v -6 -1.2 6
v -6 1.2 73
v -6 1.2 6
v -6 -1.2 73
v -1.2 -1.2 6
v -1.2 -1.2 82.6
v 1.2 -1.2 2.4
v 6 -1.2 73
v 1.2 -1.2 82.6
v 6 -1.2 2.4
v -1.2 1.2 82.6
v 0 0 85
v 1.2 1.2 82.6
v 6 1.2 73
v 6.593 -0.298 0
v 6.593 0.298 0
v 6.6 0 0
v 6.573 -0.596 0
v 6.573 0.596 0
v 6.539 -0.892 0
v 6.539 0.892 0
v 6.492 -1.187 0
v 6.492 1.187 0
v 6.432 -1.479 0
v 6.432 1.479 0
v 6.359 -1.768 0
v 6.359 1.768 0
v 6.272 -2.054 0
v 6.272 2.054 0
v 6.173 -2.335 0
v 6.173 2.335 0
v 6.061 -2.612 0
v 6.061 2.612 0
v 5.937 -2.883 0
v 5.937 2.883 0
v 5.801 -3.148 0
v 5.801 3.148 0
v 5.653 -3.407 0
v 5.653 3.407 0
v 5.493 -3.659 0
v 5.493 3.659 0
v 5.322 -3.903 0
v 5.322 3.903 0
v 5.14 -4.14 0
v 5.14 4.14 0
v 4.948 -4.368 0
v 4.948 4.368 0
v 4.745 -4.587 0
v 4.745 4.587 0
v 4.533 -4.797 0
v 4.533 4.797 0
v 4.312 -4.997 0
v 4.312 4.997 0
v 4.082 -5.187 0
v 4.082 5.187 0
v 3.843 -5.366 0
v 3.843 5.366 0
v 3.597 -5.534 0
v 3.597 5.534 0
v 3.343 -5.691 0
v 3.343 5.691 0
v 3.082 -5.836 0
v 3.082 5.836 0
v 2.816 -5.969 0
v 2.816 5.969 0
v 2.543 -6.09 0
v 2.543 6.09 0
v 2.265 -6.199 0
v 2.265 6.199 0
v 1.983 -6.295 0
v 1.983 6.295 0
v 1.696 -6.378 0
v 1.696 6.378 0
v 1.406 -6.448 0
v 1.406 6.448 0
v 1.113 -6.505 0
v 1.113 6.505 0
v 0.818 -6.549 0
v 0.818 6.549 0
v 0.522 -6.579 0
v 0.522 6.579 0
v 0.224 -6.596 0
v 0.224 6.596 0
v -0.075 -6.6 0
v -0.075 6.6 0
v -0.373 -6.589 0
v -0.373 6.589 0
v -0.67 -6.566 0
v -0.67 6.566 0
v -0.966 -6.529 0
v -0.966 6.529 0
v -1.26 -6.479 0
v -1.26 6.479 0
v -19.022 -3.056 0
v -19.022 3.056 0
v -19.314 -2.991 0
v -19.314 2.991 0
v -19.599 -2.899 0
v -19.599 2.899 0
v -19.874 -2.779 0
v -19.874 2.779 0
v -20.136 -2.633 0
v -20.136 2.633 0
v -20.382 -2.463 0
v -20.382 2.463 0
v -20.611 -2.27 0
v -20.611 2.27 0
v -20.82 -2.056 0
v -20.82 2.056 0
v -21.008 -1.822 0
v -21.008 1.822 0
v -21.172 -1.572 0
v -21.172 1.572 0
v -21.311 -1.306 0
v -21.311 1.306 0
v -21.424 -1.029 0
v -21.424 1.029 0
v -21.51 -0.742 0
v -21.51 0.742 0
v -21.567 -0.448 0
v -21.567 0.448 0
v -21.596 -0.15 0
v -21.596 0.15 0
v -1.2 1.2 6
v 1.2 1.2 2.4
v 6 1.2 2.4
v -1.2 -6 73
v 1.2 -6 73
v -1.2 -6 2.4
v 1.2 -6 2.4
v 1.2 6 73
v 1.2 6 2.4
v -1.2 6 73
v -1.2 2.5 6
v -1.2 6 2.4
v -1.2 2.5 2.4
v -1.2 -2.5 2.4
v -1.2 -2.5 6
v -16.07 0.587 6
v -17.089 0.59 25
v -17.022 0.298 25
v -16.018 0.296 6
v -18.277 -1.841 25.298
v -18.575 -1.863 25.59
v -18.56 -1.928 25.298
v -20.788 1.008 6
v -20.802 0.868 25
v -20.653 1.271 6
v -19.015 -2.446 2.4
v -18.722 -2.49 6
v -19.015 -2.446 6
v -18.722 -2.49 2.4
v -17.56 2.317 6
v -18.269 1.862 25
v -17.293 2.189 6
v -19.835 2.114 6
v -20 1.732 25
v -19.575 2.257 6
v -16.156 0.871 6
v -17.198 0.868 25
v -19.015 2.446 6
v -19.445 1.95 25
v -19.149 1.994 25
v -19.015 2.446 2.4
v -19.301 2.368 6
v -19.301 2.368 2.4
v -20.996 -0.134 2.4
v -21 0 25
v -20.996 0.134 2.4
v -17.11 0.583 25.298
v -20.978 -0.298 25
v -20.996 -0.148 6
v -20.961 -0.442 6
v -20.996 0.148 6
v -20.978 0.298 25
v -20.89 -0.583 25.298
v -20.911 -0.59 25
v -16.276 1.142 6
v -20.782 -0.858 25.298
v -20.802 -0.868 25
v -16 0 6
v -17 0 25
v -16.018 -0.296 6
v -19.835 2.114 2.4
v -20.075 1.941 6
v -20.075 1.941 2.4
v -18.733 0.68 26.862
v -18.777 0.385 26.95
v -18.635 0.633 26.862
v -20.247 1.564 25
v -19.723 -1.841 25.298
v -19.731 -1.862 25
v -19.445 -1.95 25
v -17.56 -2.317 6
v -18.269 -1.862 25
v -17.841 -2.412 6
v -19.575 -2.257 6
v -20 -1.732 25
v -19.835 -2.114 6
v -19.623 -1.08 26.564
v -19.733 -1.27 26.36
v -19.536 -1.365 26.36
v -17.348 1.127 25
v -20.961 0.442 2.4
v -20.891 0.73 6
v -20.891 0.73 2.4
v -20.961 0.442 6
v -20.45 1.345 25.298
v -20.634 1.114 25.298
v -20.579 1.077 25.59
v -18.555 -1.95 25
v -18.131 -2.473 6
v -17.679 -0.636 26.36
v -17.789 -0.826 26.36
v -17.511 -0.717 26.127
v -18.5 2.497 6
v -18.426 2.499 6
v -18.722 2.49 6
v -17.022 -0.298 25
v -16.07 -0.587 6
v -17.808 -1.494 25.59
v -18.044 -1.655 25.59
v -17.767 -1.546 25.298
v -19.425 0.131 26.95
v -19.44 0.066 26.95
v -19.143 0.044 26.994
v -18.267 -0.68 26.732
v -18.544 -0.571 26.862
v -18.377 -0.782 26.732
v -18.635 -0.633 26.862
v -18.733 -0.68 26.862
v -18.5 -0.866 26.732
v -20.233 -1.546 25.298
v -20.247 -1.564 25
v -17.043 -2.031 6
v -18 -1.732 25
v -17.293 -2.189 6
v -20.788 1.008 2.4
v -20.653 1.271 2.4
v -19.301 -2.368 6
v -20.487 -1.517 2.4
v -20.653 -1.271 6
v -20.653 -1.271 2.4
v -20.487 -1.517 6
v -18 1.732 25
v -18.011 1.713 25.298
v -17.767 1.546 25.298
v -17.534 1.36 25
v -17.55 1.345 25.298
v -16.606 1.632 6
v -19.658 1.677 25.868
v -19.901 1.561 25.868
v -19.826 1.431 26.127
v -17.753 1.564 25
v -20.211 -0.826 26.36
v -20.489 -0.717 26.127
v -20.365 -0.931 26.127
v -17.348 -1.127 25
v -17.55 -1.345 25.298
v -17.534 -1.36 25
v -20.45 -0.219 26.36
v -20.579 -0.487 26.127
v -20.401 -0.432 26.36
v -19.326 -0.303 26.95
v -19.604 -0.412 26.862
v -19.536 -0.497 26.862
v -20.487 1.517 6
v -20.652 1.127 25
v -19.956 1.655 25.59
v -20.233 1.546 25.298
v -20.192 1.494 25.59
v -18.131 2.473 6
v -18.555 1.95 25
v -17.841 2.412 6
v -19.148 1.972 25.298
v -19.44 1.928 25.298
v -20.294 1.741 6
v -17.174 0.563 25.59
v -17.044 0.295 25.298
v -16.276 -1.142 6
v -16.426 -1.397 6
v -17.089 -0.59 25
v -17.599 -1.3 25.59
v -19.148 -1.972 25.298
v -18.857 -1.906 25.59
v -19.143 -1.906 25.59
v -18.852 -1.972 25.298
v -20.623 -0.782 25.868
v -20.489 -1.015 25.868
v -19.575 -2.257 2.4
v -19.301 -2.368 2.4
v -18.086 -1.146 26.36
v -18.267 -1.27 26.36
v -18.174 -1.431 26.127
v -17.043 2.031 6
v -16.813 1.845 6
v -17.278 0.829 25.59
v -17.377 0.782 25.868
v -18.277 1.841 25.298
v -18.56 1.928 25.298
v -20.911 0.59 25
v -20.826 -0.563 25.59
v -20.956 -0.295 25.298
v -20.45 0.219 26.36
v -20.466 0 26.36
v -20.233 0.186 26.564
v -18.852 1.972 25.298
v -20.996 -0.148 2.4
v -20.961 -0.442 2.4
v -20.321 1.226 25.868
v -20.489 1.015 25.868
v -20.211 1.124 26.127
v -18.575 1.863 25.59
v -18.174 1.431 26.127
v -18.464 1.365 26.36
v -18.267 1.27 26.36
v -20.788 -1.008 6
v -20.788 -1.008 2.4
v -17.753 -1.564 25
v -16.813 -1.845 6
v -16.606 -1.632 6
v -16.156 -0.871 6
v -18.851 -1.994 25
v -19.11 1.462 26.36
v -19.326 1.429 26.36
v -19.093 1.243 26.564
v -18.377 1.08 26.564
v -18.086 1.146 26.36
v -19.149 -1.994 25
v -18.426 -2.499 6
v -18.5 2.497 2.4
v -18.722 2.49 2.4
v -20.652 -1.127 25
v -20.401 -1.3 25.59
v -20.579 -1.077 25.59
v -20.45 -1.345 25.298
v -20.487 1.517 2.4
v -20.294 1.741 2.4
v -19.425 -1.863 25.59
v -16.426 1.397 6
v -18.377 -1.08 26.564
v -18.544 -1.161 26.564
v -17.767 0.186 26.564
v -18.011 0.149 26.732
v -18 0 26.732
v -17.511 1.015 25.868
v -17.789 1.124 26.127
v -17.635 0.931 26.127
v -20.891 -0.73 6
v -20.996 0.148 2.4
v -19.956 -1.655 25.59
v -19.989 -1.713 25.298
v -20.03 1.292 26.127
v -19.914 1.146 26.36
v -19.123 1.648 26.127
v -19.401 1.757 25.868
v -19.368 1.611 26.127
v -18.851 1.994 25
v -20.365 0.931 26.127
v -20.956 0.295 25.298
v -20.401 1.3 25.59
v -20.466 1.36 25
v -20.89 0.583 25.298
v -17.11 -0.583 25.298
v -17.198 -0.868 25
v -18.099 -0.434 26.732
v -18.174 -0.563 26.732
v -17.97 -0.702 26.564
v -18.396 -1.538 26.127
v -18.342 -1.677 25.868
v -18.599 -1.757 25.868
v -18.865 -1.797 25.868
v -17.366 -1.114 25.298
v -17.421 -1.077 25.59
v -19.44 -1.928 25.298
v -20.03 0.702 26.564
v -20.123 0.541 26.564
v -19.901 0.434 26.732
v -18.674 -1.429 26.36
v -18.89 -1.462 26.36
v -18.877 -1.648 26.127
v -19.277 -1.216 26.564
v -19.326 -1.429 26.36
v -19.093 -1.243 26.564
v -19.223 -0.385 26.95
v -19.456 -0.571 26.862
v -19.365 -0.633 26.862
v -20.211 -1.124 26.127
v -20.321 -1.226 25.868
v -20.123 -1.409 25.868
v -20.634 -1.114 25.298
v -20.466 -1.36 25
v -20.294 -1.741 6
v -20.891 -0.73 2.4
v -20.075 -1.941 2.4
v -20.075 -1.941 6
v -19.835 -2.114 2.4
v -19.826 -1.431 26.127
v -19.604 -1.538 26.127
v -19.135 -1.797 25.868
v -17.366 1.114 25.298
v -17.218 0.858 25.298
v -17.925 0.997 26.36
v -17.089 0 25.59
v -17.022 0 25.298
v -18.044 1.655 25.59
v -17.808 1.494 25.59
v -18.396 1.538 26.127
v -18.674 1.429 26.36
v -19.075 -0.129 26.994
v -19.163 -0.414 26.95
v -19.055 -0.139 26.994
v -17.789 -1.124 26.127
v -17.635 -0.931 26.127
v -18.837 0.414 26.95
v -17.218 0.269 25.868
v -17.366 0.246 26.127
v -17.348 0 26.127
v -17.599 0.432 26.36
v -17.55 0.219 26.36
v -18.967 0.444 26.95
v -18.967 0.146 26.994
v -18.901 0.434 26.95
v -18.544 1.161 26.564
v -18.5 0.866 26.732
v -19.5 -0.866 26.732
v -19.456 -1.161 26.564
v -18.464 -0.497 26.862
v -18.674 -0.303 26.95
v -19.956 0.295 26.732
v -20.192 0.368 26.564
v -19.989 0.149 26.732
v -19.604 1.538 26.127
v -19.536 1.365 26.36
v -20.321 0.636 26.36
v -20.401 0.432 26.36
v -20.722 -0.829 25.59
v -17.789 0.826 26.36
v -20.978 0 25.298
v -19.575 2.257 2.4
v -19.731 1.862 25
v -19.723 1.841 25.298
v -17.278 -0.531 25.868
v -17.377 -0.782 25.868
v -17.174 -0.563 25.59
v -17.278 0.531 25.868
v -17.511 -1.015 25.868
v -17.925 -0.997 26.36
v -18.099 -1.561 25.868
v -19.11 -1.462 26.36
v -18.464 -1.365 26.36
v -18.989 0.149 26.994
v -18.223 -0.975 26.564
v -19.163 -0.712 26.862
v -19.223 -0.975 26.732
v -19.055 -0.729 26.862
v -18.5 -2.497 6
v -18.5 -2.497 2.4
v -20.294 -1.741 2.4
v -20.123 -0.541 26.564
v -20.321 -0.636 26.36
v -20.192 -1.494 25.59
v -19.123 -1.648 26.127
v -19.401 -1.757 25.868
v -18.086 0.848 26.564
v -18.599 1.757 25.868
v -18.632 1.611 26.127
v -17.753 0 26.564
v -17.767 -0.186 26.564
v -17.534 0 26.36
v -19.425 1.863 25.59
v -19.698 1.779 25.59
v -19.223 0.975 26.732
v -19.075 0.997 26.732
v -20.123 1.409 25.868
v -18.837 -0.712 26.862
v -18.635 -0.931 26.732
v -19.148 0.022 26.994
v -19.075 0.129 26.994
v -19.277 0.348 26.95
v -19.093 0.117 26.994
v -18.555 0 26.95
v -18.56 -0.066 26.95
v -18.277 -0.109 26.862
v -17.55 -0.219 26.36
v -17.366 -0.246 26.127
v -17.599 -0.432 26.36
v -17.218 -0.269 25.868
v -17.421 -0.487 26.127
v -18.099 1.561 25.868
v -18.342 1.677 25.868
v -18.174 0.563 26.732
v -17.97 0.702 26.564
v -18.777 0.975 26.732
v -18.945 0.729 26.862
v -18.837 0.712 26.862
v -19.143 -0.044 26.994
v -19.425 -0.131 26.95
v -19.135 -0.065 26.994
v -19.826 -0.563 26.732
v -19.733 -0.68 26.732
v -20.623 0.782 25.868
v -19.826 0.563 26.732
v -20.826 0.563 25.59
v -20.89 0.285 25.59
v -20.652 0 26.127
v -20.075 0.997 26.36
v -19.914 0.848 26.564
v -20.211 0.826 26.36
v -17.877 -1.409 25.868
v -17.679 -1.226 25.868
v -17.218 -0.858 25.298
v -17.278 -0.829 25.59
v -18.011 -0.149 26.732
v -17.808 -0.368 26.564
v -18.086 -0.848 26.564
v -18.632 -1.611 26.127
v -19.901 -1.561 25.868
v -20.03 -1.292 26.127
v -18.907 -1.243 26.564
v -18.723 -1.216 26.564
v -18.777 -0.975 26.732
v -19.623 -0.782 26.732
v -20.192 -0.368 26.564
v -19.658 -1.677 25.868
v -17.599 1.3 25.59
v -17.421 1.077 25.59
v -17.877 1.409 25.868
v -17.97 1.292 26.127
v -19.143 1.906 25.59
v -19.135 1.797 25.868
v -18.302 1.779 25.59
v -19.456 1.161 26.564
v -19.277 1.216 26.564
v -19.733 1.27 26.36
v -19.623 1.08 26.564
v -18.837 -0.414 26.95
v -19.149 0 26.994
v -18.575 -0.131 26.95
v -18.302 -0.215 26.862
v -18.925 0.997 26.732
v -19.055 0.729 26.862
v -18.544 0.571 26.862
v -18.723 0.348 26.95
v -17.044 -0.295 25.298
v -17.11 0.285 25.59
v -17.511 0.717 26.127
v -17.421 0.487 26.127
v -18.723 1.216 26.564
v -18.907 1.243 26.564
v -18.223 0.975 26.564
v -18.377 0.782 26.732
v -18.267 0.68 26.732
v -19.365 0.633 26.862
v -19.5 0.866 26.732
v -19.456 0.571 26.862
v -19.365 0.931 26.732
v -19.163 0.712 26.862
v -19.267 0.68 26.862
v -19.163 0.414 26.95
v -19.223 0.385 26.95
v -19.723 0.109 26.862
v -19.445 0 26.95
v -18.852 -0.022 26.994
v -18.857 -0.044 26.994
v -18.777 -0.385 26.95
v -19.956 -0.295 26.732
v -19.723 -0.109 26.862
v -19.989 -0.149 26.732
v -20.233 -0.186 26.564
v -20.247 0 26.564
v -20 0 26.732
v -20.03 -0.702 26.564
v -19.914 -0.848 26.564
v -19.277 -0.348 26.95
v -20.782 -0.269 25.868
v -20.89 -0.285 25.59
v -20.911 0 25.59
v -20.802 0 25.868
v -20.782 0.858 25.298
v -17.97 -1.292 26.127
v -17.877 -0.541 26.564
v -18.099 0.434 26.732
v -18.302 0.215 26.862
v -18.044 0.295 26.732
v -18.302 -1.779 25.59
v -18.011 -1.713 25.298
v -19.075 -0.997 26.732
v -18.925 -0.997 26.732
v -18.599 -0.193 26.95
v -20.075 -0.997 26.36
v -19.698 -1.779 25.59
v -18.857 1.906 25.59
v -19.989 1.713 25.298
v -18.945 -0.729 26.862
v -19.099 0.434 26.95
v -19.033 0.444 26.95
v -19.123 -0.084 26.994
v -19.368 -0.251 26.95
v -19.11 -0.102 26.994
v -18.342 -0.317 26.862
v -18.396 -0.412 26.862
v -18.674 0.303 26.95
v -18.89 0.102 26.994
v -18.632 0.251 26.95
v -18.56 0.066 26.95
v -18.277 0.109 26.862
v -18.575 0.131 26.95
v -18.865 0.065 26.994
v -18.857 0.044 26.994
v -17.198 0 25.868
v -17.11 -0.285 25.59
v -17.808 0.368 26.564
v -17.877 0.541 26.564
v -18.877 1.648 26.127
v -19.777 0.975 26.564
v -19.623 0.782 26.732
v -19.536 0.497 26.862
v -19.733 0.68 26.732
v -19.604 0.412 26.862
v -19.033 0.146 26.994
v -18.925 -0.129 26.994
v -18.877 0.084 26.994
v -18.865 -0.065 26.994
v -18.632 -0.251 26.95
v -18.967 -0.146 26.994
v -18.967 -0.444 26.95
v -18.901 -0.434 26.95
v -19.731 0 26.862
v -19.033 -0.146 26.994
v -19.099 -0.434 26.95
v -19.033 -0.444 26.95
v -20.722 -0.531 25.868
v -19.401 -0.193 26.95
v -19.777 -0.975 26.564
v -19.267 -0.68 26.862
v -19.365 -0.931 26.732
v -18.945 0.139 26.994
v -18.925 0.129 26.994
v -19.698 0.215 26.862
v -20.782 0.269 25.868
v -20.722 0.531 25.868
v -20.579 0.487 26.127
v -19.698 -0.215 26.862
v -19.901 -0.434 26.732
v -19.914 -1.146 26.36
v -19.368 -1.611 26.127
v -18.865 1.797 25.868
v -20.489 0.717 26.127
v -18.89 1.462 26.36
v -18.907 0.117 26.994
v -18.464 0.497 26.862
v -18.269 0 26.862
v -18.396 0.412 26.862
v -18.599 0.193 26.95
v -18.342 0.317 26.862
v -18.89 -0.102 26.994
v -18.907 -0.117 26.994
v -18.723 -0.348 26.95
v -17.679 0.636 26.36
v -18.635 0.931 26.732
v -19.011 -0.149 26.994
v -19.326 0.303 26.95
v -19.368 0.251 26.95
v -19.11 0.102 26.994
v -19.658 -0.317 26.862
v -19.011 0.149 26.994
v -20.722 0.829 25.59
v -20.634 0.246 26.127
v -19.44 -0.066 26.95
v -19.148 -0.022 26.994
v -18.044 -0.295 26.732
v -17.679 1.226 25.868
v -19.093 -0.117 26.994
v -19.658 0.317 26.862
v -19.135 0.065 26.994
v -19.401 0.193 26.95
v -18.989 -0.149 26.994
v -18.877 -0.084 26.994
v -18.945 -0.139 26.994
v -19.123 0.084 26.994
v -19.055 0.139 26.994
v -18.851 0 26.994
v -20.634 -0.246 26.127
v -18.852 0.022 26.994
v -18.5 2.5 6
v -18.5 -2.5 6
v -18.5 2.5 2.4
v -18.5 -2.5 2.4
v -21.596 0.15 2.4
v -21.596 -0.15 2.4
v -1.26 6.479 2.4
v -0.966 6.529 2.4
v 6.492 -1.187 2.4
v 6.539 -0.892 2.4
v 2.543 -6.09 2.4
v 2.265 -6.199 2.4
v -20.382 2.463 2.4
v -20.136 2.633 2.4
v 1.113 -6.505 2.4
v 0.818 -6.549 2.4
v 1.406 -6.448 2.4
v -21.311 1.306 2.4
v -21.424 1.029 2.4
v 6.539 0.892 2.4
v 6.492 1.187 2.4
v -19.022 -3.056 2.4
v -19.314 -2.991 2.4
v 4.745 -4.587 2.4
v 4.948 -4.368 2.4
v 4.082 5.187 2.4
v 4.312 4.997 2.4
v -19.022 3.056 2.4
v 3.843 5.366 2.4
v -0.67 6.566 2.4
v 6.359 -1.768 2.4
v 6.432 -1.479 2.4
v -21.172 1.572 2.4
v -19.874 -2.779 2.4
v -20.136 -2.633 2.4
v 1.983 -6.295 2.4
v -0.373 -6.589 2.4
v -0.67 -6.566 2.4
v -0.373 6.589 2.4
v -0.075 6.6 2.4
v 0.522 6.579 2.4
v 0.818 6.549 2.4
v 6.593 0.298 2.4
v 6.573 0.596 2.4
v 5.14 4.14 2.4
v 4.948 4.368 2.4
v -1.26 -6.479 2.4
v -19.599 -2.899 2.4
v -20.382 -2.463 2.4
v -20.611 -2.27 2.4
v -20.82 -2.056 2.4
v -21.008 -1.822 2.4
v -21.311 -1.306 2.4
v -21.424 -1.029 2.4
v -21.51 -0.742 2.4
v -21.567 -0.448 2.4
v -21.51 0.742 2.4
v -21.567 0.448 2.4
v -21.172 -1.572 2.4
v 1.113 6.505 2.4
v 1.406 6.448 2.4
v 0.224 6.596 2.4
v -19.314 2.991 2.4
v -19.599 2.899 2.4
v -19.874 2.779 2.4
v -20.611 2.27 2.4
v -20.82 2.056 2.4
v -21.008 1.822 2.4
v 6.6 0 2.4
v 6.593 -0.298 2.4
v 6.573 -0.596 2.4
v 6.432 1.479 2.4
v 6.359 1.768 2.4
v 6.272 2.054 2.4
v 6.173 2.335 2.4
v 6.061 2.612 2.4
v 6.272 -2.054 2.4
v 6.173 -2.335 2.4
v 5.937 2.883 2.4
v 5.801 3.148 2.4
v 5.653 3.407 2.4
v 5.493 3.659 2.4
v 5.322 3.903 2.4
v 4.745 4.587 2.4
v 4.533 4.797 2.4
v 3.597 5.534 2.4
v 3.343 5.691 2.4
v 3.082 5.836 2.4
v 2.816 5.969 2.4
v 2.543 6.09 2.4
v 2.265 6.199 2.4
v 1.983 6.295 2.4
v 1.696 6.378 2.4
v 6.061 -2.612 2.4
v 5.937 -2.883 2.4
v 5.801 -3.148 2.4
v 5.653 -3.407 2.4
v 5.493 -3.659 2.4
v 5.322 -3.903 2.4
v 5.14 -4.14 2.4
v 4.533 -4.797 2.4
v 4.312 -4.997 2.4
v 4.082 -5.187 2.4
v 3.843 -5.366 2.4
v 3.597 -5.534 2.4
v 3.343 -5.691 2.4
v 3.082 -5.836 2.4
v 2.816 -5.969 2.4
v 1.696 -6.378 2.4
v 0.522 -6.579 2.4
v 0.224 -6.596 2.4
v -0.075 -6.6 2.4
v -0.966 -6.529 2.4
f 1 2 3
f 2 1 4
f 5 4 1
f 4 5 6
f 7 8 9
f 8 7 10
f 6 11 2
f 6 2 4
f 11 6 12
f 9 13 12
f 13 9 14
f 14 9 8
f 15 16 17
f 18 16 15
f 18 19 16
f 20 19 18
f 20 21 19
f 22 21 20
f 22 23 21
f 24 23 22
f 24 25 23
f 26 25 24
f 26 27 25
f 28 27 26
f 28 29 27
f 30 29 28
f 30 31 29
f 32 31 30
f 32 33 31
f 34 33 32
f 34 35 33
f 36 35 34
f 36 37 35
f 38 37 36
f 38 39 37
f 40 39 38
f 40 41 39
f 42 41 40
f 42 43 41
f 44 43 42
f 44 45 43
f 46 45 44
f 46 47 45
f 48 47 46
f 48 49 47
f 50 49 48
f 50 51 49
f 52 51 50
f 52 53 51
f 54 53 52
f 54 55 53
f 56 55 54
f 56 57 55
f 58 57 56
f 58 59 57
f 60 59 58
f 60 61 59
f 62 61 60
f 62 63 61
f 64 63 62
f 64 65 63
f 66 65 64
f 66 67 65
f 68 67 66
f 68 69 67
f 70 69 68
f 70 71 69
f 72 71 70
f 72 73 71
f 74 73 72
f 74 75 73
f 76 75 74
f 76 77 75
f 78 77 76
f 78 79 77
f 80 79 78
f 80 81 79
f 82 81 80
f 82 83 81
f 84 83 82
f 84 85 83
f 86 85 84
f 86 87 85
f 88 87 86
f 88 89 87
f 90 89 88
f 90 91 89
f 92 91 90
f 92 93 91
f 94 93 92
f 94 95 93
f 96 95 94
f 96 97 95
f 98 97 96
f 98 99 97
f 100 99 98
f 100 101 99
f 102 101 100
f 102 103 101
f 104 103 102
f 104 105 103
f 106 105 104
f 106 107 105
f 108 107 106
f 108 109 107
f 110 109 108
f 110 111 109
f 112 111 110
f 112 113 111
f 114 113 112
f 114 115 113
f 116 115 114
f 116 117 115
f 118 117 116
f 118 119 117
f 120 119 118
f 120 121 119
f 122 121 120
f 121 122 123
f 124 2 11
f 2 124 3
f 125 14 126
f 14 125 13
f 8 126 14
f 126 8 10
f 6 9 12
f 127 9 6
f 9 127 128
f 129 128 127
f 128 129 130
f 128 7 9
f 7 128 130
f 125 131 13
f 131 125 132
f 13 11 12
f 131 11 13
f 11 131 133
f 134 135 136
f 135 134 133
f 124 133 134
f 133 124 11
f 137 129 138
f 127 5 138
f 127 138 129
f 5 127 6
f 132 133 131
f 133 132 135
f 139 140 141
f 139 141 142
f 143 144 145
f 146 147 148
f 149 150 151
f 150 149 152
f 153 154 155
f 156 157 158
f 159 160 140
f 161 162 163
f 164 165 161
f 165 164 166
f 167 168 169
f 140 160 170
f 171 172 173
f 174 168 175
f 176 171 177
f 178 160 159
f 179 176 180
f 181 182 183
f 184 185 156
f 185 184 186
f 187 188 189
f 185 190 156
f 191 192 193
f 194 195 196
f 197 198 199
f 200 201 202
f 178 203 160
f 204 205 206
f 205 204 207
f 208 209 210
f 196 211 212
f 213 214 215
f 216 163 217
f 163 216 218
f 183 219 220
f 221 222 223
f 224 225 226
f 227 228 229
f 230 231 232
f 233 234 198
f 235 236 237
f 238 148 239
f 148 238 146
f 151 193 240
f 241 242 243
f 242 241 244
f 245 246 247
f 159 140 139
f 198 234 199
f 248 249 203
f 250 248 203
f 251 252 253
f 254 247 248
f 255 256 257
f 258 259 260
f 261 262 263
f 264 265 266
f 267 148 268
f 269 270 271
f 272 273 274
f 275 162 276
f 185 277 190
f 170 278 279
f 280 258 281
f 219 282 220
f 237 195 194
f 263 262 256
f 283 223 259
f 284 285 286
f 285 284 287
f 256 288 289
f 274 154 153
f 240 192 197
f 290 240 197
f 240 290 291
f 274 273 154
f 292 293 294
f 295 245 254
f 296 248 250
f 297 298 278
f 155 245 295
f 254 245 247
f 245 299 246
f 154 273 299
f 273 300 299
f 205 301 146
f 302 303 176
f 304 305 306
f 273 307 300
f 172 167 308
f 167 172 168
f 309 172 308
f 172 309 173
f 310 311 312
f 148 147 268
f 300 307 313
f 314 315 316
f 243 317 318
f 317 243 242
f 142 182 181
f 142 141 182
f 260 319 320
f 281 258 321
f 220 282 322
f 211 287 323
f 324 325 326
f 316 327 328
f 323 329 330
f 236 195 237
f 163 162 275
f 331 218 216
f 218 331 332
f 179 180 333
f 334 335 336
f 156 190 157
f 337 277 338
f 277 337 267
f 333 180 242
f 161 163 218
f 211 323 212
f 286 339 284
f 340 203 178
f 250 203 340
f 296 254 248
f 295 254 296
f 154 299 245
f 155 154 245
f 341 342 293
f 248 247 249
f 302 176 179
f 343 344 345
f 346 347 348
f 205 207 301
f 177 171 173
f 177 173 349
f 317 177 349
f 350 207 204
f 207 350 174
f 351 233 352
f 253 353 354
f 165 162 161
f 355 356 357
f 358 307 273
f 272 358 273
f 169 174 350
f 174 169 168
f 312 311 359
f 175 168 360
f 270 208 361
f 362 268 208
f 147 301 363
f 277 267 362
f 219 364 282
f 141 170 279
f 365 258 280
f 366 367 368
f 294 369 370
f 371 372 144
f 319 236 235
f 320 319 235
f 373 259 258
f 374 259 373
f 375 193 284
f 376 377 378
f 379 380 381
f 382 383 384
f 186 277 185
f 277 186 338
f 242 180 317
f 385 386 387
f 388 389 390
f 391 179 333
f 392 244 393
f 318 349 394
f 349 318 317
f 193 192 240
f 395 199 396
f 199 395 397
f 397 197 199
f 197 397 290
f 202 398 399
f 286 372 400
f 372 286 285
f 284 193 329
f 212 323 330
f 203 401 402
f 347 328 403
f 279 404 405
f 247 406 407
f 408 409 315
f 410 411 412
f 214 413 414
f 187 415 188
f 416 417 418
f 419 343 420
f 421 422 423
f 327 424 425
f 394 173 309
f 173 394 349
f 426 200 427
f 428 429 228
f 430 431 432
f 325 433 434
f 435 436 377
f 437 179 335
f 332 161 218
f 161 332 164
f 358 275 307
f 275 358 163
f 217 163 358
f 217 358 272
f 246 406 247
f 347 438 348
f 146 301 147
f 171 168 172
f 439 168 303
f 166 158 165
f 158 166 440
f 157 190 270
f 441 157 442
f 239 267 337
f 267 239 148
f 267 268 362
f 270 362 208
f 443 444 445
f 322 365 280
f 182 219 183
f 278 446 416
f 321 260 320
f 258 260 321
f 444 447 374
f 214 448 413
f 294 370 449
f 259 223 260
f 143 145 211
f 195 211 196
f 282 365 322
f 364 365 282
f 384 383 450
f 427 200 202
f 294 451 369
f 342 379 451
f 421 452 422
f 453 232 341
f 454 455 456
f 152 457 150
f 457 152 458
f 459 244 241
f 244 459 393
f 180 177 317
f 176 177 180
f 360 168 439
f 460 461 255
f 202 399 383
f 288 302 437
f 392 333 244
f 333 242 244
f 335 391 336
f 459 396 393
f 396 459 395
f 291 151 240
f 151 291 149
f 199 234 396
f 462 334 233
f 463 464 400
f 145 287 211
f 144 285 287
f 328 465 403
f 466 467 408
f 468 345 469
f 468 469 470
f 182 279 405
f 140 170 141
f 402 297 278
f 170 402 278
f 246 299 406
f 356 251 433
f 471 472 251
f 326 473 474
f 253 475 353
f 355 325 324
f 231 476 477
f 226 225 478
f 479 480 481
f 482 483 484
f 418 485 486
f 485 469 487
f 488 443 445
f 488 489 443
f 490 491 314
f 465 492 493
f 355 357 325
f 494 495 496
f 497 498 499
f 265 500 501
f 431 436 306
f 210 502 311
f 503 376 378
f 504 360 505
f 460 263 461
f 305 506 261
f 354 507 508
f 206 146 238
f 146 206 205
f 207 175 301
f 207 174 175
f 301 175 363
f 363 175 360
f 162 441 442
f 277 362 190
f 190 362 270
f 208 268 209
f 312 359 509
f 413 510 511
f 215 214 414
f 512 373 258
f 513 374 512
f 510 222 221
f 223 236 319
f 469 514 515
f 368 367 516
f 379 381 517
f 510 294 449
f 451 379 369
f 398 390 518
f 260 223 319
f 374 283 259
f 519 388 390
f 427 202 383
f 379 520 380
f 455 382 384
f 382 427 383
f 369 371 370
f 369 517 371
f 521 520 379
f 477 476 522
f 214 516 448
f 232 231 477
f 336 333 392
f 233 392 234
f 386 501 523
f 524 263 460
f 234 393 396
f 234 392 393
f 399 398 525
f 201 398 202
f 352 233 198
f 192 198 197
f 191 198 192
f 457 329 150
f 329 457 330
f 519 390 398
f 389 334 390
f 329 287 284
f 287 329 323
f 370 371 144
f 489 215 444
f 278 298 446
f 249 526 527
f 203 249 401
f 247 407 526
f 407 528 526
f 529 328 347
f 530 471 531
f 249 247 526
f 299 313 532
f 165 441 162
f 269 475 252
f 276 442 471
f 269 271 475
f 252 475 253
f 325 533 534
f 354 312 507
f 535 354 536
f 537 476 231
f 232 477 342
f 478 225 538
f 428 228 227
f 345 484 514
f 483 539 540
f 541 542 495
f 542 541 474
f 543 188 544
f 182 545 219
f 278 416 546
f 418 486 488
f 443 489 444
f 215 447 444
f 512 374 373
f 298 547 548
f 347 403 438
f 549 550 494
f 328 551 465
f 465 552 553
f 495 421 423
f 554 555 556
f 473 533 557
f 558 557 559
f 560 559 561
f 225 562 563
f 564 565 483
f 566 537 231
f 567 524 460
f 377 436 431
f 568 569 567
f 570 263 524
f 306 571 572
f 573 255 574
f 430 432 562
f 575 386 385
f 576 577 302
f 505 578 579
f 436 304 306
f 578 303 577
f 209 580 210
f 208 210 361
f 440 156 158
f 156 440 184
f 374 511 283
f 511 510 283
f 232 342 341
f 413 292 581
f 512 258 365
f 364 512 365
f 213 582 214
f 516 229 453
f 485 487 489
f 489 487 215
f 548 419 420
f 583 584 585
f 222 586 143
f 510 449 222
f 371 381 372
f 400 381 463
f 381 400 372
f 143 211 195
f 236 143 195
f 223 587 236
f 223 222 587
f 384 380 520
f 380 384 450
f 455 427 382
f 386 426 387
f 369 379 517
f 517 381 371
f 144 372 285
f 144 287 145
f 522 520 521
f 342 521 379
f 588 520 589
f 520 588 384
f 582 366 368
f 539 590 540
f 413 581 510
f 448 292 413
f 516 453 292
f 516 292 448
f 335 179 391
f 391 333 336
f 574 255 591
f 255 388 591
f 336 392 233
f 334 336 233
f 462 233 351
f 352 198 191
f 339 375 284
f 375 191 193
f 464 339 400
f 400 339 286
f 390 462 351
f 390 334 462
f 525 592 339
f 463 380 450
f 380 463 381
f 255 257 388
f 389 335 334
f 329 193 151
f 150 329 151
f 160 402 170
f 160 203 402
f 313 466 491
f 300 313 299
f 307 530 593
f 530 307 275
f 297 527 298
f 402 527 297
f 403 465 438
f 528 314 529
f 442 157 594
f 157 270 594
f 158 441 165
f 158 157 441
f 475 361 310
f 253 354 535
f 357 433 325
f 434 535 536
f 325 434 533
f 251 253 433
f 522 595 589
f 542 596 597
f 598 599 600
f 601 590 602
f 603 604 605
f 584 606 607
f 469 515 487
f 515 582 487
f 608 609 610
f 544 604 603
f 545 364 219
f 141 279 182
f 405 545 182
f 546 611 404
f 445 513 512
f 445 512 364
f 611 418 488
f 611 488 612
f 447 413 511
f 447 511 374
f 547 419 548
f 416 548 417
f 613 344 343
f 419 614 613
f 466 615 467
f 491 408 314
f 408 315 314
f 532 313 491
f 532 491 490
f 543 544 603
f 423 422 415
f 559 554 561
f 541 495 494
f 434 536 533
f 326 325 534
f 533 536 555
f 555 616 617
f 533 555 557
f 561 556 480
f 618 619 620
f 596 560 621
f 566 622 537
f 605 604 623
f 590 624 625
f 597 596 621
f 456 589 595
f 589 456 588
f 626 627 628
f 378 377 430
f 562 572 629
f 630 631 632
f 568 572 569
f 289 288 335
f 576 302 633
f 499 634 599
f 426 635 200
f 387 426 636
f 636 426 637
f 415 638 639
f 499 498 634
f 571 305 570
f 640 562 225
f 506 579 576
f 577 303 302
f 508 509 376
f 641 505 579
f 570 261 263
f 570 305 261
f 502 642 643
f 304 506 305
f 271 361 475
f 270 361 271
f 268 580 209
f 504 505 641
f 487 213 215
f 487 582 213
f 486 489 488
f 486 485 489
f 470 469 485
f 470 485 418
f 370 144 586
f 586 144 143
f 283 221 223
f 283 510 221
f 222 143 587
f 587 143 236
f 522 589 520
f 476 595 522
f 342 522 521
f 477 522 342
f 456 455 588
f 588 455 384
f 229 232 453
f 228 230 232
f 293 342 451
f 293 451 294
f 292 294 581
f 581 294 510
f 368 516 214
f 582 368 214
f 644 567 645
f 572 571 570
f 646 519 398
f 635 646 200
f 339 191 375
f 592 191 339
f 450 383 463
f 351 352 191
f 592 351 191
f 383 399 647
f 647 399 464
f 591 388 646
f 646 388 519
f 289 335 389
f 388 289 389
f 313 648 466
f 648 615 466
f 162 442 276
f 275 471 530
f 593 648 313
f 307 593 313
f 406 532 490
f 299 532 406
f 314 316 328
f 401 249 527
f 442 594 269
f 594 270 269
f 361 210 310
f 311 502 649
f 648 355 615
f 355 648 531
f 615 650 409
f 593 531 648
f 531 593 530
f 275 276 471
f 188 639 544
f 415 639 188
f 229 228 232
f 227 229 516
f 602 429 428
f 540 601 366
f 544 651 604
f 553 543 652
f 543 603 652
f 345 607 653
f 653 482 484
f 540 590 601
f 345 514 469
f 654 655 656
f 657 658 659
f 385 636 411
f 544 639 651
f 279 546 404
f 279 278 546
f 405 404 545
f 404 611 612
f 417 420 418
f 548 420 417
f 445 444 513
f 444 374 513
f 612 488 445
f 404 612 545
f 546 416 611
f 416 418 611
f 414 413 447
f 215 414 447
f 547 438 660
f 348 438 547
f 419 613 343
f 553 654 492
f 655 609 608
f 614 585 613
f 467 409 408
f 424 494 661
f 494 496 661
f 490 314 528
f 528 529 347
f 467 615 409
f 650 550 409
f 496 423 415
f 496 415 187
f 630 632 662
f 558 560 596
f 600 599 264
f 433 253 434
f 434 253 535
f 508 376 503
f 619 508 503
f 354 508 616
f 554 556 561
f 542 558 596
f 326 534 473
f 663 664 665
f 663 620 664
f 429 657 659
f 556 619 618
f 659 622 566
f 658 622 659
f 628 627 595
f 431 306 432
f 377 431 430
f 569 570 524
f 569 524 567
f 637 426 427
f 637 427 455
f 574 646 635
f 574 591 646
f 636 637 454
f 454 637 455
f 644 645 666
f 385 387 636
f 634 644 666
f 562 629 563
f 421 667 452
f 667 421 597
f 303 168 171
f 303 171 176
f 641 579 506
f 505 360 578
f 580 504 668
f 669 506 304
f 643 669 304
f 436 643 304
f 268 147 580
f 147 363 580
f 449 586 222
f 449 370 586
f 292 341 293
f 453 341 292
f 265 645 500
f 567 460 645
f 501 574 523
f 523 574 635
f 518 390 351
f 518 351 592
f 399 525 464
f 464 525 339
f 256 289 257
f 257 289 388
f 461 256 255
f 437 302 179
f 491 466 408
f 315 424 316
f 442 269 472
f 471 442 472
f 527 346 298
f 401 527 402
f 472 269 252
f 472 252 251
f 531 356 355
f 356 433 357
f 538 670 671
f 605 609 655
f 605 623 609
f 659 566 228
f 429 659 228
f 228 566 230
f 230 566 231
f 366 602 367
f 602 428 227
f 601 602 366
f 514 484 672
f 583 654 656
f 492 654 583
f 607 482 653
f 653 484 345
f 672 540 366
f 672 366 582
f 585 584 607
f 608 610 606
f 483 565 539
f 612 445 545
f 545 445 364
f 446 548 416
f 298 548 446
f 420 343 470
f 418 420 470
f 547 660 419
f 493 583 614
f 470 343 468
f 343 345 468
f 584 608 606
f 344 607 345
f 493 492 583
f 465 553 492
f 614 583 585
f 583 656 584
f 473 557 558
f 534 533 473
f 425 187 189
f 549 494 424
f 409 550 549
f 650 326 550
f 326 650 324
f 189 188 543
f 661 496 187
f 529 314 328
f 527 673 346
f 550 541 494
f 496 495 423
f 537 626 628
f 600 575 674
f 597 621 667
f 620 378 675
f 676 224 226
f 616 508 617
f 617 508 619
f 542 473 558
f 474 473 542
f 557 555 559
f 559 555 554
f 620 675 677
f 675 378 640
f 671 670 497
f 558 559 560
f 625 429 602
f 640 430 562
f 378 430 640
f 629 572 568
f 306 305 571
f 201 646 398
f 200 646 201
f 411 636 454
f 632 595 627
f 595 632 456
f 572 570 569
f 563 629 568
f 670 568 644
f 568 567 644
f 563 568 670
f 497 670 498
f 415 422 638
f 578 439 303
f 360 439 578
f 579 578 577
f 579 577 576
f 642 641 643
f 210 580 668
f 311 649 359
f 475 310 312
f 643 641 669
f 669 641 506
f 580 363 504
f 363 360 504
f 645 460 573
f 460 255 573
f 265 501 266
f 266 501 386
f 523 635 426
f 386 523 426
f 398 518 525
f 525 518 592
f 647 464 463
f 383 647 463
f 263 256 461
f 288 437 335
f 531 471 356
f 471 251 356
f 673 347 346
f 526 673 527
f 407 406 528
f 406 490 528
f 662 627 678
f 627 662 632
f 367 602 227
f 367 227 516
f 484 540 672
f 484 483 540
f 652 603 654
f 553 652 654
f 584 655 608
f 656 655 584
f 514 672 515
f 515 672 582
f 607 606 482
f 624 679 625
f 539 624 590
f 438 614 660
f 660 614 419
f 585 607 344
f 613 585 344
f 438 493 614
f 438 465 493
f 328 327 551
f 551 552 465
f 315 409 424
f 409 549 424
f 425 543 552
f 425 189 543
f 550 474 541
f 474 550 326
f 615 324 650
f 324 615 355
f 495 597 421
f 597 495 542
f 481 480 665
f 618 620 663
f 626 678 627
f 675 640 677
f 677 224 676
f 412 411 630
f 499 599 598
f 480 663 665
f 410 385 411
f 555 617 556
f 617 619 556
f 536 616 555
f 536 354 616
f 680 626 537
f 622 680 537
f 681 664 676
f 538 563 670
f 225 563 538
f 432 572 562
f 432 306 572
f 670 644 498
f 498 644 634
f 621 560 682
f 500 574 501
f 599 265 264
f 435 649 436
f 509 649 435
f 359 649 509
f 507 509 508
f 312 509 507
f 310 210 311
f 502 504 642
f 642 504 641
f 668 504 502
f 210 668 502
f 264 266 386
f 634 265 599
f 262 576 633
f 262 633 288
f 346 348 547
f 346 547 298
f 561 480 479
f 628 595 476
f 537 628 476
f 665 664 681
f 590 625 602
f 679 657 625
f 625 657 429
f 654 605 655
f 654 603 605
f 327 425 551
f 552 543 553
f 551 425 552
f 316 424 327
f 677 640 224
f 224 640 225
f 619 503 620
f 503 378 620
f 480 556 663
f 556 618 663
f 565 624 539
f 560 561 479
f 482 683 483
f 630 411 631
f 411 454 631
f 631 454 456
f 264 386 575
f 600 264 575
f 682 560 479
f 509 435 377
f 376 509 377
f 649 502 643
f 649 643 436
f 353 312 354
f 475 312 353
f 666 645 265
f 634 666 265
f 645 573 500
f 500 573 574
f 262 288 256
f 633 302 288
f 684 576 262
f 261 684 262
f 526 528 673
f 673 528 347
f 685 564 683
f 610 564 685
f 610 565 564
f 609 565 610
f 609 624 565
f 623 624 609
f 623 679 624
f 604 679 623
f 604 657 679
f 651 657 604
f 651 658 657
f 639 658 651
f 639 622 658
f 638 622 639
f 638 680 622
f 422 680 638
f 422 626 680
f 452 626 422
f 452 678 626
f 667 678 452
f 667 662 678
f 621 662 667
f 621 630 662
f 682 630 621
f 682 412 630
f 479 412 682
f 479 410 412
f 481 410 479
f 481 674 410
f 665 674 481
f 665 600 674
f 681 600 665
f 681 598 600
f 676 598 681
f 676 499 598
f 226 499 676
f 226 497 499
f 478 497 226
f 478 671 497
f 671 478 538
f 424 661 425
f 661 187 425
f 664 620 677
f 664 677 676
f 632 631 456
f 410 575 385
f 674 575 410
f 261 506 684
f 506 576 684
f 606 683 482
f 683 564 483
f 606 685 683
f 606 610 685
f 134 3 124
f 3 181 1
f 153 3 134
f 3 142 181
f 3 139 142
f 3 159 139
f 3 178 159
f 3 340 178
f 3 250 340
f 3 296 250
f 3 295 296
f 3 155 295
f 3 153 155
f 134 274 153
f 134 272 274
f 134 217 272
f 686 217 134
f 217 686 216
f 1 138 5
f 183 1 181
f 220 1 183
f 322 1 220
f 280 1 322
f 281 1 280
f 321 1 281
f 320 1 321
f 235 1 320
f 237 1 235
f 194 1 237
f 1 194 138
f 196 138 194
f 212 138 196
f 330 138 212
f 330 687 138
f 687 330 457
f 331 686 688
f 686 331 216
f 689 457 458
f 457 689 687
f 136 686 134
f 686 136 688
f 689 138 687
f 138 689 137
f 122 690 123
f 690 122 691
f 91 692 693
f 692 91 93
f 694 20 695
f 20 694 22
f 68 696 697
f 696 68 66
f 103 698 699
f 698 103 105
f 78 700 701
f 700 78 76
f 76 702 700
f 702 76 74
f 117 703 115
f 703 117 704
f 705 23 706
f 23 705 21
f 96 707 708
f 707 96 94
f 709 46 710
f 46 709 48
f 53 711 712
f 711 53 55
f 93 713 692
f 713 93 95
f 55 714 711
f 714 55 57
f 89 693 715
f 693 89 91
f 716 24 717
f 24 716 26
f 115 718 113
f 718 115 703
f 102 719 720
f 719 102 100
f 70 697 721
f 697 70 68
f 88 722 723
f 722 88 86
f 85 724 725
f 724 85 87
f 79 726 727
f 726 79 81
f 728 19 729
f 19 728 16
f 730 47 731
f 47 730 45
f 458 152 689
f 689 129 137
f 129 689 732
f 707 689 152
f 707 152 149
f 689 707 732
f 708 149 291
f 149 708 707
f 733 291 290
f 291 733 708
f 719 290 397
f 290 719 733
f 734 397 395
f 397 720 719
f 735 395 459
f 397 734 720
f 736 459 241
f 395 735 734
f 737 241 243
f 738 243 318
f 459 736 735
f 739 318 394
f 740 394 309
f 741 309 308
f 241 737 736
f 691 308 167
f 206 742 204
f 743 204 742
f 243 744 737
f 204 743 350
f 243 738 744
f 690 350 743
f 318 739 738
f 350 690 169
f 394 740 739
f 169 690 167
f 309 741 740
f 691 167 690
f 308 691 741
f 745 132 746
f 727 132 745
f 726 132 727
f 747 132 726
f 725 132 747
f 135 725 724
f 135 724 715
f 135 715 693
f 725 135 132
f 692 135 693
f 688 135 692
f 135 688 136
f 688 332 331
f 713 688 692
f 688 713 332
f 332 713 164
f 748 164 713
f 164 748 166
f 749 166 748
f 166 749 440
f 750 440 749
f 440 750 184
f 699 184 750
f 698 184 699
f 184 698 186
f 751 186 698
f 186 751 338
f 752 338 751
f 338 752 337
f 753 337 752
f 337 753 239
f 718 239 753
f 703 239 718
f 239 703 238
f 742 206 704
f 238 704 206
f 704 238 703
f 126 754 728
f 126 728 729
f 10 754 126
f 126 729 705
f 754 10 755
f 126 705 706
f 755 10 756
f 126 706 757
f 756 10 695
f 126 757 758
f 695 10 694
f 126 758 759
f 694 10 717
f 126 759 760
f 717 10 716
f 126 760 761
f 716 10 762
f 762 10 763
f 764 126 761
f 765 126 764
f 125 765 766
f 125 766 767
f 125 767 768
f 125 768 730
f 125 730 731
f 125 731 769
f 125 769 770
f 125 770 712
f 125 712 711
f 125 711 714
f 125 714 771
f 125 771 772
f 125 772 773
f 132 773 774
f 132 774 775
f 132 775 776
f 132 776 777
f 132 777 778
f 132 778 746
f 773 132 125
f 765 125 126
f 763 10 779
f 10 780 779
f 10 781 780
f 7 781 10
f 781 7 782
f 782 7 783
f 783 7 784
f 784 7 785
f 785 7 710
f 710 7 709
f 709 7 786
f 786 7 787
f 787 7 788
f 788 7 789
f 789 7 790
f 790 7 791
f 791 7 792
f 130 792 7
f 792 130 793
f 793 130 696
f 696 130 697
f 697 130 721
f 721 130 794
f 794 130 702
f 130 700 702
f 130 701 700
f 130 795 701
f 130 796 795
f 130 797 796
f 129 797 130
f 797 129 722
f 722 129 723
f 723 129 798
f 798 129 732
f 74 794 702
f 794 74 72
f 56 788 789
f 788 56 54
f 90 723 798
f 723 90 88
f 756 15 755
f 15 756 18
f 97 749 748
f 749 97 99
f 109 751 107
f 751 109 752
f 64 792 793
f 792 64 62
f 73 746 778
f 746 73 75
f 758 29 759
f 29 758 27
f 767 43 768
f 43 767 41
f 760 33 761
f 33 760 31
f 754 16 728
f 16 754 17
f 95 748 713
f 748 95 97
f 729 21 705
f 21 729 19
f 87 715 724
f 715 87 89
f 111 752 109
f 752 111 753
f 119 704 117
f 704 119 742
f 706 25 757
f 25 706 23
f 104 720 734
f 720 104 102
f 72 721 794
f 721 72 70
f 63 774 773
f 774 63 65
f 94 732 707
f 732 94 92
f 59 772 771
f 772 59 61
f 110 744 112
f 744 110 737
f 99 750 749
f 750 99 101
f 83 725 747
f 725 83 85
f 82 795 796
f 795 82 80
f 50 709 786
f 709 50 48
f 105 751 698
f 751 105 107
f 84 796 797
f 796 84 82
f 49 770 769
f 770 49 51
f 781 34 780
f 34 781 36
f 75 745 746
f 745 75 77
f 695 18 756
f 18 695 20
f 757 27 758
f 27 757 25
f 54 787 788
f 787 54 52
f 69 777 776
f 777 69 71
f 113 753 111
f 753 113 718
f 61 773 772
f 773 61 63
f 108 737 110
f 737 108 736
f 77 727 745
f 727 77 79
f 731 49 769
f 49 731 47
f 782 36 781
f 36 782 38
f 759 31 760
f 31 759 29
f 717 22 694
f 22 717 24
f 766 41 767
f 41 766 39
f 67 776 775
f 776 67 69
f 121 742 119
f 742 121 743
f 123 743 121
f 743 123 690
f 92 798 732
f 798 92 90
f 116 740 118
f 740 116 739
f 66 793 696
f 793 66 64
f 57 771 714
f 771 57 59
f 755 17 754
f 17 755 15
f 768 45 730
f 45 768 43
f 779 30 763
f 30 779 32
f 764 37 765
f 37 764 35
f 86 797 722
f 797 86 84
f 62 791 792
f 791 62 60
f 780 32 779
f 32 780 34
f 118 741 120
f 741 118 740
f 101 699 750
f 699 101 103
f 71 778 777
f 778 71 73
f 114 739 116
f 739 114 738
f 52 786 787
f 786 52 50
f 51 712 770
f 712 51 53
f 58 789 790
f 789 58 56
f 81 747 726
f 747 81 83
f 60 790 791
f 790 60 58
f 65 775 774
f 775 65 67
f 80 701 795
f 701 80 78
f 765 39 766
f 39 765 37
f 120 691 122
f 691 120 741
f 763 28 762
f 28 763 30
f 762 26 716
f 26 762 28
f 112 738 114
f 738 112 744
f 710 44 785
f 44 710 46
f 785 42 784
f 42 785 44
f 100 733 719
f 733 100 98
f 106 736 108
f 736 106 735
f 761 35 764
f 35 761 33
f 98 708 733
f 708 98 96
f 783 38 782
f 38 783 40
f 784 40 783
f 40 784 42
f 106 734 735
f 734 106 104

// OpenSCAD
length = 85;
width = 12;

minThickness = 2.4;

holderLength = 25;
holderWidth = 5;
holderOpening = 10;
holderTipWidth = 4;

connectorThickness = 6;

$fa = 0.5;
$fs = 0.3;

module hook() {    
    pointyEnd();
    holder();
}

module pointyEnd() {
    // TODO: fix the pointy part of the pointy end
    difference() {
        union() {
            pointyPiece();
            rotate([0, 0, 90]) pointyPiece();
        }
        
        cube([minThickness, minThickness, 2 * length], true);
    }
    
    intersection() {
        pointyPiece();
        rotate([0, 0, 90]) pointyPiece();
    }
}

module pointyPiece() {
    translate([-width / 2, minThickness / 2, 0])
    rotate([90, 0, 0])
    linear_extrude(minThickness)
    polygon([
        [0, 0],
        [width, 0],
        [width, length - width],
        [width / 2, length],
        [0, length - width]
    ]);
}

module holder() {
    linear_extrude(minThickness)
    hull() {
        circle(d = width + minThickness / 2);
        
        translate([-((width + holderWidth) / 2 + holderOpening), 0])
        circle(d = holderWidth + minThickness / 2);
    }
    
    translate([-((width + holderWidth) / 2 + holderOpening), 0]) {
        hull() {
            linear_extrude(connectorThickness)
            circle(d = holderWidth);
            
            translate([-(holderWidth - holderTipWidth) / 2, 0, holderLength]) {
                sphere(d = holderTipWidth);
            }
        }
        
        translate([0, -holderWidth / 2, 0])
        cube([(width + holderWidth) / 2 + holderOpening, holderWidth, connectorThickness]);
    }
}

hook();
